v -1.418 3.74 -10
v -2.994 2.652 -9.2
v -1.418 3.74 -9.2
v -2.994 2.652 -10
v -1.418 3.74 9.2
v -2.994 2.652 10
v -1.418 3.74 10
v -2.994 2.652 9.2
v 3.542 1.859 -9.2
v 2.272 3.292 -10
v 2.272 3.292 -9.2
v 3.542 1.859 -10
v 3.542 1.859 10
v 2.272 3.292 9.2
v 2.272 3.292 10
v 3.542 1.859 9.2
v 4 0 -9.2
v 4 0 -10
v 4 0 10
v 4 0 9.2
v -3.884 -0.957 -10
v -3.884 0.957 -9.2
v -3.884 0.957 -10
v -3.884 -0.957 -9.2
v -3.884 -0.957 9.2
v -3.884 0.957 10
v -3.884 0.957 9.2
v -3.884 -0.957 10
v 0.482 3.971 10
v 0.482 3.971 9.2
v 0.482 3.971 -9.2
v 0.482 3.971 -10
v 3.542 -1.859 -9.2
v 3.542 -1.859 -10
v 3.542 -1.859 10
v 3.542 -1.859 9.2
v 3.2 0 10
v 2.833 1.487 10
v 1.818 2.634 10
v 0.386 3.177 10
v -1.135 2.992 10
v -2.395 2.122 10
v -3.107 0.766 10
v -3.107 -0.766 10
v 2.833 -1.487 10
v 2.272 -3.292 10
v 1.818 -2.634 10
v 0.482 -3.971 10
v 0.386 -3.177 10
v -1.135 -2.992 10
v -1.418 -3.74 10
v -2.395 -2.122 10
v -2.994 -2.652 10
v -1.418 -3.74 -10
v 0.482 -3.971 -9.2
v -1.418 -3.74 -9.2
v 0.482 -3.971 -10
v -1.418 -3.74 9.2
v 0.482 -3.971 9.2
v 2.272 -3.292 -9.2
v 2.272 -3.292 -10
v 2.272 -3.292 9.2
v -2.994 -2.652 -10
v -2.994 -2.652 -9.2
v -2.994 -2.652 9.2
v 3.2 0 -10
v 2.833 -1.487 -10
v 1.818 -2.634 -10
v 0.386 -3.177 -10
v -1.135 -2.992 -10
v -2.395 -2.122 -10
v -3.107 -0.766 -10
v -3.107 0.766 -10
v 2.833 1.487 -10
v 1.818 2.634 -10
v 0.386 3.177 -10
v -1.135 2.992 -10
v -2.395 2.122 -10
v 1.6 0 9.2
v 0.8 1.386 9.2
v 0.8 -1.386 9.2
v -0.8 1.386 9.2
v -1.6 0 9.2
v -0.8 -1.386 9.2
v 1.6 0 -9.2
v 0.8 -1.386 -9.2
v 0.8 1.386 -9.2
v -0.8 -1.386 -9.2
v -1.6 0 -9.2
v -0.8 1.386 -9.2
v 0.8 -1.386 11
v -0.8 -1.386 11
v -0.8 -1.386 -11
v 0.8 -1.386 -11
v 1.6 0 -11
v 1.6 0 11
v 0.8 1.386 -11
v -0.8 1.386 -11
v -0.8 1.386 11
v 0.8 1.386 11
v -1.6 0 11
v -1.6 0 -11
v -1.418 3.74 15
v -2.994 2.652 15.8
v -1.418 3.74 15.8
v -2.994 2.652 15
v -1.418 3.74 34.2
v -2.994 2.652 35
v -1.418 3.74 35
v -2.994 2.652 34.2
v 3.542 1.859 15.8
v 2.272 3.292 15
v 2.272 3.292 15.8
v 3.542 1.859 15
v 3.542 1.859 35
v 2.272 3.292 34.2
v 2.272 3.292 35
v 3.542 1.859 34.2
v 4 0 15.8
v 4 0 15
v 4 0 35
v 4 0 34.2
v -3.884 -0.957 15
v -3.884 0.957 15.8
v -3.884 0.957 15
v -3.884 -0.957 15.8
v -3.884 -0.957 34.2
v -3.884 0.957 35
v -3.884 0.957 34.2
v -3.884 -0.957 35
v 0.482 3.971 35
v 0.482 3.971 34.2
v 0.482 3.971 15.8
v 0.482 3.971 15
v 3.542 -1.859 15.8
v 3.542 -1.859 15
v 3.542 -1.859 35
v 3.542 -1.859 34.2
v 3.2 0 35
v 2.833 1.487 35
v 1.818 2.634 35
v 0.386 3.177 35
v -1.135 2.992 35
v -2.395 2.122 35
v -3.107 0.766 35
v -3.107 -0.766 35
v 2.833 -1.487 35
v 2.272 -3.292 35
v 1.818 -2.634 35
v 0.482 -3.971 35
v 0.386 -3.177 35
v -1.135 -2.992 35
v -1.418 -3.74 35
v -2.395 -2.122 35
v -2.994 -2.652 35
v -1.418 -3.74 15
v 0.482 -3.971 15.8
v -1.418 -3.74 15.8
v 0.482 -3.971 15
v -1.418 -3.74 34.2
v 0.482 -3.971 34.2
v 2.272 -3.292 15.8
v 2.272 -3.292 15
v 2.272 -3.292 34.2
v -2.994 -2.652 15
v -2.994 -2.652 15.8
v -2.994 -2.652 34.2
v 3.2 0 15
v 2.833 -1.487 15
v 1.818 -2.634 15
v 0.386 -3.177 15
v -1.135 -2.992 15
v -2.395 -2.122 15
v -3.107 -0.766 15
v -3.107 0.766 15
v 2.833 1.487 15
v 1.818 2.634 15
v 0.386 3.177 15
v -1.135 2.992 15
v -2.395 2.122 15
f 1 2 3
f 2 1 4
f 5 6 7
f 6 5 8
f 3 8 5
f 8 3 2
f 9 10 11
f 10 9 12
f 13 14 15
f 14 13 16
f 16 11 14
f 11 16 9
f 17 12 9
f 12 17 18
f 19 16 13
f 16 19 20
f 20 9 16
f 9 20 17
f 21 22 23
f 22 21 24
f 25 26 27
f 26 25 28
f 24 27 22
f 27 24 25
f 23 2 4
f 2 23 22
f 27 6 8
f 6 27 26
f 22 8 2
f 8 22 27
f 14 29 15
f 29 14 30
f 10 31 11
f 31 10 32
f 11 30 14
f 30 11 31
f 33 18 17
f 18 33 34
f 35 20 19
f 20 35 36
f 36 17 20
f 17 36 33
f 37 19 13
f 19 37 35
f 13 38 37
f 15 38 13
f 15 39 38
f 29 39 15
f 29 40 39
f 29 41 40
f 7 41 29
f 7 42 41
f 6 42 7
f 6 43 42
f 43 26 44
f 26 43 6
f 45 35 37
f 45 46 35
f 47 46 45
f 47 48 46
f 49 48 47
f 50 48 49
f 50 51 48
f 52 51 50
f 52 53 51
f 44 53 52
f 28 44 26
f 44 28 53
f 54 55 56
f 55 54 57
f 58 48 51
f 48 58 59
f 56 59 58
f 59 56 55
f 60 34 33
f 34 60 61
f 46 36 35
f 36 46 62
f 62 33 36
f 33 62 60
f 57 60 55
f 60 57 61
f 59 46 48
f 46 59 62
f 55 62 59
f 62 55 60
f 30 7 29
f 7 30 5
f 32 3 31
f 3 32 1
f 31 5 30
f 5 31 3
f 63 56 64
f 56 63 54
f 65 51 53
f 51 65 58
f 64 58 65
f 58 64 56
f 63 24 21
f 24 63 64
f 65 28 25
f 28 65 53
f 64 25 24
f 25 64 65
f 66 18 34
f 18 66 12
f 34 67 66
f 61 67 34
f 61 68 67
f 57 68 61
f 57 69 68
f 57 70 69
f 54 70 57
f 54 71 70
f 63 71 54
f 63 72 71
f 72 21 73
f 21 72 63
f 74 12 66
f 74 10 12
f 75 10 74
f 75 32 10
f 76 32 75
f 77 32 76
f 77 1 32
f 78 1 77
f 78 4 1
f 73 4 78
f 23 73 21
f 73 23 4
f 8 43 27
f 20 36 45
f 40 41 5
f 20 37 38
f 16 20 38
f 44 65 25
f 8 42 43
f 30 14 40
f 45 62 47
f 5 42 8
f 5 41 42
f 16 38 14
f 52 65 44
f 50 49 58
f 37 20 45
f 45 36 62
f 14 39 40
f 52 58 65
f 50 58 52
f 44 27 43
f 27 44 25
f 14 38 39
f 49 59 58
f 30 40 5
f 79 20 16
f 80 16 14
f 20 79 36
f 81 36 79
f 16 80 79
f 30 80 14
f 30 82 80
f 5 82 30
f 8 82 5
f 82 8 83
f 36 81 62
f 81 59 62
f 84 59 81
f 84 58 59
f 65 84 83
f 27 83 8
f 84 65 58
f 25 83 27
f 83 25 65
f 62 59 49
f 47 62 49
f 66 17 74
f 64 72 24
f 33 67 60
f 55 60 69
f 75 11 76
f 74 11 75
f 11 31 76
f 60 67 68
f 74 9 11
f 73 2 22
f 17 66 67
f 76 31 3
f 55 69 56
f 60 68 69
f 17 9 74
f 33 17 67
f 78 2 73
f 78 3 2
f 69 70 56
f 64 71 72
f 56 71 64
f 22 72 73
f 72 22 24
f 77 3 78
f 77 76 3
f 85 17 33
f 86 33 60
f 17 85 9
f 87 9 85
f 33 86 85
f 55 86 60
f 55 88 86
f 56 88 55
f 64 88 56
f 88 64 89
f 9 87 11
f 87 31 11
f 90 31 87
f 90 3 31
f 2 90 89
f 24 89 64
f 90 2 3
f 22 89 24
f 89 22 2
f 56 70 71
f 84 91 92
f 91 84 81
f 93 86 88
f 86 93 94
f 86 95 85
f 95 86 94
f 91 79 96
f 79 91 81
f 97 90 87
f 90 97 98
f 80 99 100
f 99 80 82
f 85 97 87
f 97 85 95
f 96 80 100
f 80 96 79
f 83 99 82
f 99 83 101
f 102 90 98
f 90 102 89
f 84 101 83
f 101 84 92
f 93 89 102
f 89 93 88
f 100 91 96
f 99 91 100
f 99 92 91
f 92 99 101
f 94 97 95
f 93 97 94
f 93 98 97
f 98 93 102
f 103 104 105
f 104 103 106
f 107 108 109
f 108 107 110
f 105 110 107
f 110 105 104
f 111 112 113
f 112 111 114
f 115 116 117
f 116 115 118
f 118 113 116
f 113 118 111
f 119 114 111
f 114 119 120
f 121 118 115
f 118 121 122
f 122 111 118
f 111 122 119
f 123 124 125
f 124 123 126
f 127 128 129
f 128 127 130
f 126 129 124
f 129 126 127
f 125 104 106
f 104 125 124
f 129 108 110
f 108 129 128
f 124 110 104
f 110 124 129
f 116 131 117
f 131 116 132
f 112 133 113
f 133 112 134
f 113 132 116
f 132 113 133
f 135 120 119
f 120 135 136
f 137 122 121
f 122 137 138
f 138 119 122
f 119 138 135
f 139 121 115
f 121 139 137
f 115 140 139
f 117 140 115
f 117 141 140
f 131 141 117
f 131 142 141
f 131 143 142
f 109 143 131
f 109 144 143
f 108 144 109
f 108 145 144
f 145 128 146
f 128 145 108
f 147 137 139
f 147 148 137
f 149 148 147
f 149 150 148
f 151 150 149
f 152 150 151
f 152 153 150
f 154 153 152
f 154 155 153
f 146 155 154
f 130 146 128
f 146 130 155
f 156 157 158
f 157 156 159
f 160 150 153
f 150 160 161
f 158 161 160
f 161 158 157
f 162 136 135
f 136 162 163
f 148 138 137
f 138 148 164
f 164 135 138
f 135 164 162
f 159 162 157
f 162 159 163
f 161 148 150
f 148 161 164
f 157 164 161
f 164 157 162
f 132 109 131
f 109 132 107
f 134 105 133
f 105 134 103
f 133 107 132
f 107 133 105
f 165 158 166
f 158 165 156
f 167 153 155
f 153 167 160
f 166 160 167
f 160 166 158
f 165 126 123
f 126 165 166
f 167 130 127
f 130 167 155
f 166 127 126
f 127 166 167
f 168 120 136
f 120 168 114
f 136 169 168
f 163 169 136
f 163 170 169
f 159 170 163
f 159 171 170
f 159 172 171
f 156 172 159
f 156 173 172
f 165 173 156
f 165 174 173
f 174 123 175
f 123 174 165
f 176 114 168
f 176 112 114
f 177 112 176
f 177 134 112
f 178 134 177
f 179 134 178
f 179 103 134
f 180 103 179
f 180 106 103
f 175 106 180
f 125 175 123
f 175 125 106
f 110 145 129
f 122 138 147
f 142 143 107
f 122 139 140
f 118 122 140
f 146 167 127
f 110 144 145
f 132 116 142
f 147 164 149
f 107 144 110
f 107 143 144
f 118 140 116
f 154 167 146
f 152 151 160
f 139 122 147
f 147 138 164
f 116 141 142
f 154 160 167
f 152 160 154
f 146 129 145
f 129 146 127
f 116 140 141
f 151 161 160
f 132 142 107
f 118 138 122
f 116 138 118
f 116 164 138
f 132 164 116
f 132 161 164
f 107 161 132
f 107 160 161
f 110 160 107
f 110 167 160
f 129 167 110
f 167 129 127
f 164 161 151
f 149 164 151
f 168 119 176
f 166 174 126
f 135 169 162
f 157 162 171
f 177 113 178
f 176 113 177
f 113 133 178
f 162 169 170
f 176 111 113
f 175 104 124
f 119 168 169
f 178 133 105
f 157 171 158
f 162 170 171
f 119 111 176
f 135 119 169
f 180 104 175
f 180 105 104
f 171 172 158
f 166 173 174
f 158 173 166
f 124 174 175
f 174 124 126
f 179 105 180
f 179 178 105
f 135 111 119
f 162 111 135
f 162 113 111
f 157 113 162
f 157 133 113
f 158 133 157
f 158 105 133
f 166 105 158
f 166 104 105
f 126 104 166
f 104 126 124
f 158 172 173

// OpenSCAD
// Parameters
thread_diameter = 3.0; //[1.5:6.0:0.1]
overall_length = 20.0; //[10.0:40.0:0.5]
outer_diameter = 8.0; //[4.0:16.0:0.5]
thread_gender = 0; //[0:1:1]
thread_length_top = 10.0; //[5.0:20.0:0.5]
thread_length_bottom = 10.0; //[5.0:20.0:0.5]
through_thread = 1; //[0:1:1]
chamfer = 0.8; //[0.0:2.0:0.1]
overlap = 1.0; //[0.5:2.0:0.1]
clearance = 0.2; //[0.0:0.6:0.05]

// Standoff - complete geometry
module standoff() {
  color("Silver") {
    // Main body with chamfers
    difference() {
      cylinder(h=overall_length, r=outer_diameter/2, center=true);
      translate([0, 0, overall_length/2 - chamfer/2])
        cylinder(h=chamfer, r1=outer_diameter/2, r2=outer_diameter/2 - chamfer, center=true);
      translate([0, 0, -overall_length/2 + chamfer/2])
        cylinder(h=chamfer, r1=outer_diameter/2 - chamfer, r2=outer_diameter/2, center=true);
    }
    
    // Threaded bore or stud
    if (thread_gender == 0) { // Female
      if (through_thread == 1) {
        translate([0, 0, 0])
          cylinder(h=overall_length + 2*overlap, r=(thread_diameter + clearance)/2, center=true);
      } else {
        difference() {
          translate([0, 0, overall_length/2 - (thread_length_top + overlap)/2])
            cylinder(h=thread_length_top + overlap, r=(thread_diameter + clearance)/2, center=true);
          translate([0, 0, -overall_length/2 + (thread_length_bottom + overlap)/2])
            cylinder(h=thread_length_bottom + overlap, r=(thread_diameter + clearance)/2, center=true);
        }
      }
    } else { // Male
      translate([0, 0, overall_length/2 + thread_length_top/2 - overlap])
        cylinder(h=thread_length_top, r=thread_diameter/2, center=true);
      translate([0, 0, -overall_length/2 - thread_length_bottom/2 + overlap])
        cylinder(h=thread_length_bottom, r=thread_diameter/2, center=true);
    }
  }
}

// Pillar - complete geometry
module pillar() {
  color("DimGray") {
    // Main body with chamfers
    difference() {
      cylinder(h=overall_length, r=outer_diameter/2, center=true);
      translate([0, 0, overall_length/2 - chamfer/2])
        cylinder(h=chamfer, r1=outer_diameter/2, r2=outer_diameter/2 - chamfer, center=true);
      translate([0, 0, -overall_length/2 + chamfer/2])
        cylinder(h=chamfer, r1=outer_diameter/2 - chamfer, r2=outer_diameter/2, center=true);
    }
  }
}

// Assembly
module assembly() {
  standoff();
  translate([0, 0, overall_length + 5]) pillar(); // Adjust position to connect
}

assembly();
